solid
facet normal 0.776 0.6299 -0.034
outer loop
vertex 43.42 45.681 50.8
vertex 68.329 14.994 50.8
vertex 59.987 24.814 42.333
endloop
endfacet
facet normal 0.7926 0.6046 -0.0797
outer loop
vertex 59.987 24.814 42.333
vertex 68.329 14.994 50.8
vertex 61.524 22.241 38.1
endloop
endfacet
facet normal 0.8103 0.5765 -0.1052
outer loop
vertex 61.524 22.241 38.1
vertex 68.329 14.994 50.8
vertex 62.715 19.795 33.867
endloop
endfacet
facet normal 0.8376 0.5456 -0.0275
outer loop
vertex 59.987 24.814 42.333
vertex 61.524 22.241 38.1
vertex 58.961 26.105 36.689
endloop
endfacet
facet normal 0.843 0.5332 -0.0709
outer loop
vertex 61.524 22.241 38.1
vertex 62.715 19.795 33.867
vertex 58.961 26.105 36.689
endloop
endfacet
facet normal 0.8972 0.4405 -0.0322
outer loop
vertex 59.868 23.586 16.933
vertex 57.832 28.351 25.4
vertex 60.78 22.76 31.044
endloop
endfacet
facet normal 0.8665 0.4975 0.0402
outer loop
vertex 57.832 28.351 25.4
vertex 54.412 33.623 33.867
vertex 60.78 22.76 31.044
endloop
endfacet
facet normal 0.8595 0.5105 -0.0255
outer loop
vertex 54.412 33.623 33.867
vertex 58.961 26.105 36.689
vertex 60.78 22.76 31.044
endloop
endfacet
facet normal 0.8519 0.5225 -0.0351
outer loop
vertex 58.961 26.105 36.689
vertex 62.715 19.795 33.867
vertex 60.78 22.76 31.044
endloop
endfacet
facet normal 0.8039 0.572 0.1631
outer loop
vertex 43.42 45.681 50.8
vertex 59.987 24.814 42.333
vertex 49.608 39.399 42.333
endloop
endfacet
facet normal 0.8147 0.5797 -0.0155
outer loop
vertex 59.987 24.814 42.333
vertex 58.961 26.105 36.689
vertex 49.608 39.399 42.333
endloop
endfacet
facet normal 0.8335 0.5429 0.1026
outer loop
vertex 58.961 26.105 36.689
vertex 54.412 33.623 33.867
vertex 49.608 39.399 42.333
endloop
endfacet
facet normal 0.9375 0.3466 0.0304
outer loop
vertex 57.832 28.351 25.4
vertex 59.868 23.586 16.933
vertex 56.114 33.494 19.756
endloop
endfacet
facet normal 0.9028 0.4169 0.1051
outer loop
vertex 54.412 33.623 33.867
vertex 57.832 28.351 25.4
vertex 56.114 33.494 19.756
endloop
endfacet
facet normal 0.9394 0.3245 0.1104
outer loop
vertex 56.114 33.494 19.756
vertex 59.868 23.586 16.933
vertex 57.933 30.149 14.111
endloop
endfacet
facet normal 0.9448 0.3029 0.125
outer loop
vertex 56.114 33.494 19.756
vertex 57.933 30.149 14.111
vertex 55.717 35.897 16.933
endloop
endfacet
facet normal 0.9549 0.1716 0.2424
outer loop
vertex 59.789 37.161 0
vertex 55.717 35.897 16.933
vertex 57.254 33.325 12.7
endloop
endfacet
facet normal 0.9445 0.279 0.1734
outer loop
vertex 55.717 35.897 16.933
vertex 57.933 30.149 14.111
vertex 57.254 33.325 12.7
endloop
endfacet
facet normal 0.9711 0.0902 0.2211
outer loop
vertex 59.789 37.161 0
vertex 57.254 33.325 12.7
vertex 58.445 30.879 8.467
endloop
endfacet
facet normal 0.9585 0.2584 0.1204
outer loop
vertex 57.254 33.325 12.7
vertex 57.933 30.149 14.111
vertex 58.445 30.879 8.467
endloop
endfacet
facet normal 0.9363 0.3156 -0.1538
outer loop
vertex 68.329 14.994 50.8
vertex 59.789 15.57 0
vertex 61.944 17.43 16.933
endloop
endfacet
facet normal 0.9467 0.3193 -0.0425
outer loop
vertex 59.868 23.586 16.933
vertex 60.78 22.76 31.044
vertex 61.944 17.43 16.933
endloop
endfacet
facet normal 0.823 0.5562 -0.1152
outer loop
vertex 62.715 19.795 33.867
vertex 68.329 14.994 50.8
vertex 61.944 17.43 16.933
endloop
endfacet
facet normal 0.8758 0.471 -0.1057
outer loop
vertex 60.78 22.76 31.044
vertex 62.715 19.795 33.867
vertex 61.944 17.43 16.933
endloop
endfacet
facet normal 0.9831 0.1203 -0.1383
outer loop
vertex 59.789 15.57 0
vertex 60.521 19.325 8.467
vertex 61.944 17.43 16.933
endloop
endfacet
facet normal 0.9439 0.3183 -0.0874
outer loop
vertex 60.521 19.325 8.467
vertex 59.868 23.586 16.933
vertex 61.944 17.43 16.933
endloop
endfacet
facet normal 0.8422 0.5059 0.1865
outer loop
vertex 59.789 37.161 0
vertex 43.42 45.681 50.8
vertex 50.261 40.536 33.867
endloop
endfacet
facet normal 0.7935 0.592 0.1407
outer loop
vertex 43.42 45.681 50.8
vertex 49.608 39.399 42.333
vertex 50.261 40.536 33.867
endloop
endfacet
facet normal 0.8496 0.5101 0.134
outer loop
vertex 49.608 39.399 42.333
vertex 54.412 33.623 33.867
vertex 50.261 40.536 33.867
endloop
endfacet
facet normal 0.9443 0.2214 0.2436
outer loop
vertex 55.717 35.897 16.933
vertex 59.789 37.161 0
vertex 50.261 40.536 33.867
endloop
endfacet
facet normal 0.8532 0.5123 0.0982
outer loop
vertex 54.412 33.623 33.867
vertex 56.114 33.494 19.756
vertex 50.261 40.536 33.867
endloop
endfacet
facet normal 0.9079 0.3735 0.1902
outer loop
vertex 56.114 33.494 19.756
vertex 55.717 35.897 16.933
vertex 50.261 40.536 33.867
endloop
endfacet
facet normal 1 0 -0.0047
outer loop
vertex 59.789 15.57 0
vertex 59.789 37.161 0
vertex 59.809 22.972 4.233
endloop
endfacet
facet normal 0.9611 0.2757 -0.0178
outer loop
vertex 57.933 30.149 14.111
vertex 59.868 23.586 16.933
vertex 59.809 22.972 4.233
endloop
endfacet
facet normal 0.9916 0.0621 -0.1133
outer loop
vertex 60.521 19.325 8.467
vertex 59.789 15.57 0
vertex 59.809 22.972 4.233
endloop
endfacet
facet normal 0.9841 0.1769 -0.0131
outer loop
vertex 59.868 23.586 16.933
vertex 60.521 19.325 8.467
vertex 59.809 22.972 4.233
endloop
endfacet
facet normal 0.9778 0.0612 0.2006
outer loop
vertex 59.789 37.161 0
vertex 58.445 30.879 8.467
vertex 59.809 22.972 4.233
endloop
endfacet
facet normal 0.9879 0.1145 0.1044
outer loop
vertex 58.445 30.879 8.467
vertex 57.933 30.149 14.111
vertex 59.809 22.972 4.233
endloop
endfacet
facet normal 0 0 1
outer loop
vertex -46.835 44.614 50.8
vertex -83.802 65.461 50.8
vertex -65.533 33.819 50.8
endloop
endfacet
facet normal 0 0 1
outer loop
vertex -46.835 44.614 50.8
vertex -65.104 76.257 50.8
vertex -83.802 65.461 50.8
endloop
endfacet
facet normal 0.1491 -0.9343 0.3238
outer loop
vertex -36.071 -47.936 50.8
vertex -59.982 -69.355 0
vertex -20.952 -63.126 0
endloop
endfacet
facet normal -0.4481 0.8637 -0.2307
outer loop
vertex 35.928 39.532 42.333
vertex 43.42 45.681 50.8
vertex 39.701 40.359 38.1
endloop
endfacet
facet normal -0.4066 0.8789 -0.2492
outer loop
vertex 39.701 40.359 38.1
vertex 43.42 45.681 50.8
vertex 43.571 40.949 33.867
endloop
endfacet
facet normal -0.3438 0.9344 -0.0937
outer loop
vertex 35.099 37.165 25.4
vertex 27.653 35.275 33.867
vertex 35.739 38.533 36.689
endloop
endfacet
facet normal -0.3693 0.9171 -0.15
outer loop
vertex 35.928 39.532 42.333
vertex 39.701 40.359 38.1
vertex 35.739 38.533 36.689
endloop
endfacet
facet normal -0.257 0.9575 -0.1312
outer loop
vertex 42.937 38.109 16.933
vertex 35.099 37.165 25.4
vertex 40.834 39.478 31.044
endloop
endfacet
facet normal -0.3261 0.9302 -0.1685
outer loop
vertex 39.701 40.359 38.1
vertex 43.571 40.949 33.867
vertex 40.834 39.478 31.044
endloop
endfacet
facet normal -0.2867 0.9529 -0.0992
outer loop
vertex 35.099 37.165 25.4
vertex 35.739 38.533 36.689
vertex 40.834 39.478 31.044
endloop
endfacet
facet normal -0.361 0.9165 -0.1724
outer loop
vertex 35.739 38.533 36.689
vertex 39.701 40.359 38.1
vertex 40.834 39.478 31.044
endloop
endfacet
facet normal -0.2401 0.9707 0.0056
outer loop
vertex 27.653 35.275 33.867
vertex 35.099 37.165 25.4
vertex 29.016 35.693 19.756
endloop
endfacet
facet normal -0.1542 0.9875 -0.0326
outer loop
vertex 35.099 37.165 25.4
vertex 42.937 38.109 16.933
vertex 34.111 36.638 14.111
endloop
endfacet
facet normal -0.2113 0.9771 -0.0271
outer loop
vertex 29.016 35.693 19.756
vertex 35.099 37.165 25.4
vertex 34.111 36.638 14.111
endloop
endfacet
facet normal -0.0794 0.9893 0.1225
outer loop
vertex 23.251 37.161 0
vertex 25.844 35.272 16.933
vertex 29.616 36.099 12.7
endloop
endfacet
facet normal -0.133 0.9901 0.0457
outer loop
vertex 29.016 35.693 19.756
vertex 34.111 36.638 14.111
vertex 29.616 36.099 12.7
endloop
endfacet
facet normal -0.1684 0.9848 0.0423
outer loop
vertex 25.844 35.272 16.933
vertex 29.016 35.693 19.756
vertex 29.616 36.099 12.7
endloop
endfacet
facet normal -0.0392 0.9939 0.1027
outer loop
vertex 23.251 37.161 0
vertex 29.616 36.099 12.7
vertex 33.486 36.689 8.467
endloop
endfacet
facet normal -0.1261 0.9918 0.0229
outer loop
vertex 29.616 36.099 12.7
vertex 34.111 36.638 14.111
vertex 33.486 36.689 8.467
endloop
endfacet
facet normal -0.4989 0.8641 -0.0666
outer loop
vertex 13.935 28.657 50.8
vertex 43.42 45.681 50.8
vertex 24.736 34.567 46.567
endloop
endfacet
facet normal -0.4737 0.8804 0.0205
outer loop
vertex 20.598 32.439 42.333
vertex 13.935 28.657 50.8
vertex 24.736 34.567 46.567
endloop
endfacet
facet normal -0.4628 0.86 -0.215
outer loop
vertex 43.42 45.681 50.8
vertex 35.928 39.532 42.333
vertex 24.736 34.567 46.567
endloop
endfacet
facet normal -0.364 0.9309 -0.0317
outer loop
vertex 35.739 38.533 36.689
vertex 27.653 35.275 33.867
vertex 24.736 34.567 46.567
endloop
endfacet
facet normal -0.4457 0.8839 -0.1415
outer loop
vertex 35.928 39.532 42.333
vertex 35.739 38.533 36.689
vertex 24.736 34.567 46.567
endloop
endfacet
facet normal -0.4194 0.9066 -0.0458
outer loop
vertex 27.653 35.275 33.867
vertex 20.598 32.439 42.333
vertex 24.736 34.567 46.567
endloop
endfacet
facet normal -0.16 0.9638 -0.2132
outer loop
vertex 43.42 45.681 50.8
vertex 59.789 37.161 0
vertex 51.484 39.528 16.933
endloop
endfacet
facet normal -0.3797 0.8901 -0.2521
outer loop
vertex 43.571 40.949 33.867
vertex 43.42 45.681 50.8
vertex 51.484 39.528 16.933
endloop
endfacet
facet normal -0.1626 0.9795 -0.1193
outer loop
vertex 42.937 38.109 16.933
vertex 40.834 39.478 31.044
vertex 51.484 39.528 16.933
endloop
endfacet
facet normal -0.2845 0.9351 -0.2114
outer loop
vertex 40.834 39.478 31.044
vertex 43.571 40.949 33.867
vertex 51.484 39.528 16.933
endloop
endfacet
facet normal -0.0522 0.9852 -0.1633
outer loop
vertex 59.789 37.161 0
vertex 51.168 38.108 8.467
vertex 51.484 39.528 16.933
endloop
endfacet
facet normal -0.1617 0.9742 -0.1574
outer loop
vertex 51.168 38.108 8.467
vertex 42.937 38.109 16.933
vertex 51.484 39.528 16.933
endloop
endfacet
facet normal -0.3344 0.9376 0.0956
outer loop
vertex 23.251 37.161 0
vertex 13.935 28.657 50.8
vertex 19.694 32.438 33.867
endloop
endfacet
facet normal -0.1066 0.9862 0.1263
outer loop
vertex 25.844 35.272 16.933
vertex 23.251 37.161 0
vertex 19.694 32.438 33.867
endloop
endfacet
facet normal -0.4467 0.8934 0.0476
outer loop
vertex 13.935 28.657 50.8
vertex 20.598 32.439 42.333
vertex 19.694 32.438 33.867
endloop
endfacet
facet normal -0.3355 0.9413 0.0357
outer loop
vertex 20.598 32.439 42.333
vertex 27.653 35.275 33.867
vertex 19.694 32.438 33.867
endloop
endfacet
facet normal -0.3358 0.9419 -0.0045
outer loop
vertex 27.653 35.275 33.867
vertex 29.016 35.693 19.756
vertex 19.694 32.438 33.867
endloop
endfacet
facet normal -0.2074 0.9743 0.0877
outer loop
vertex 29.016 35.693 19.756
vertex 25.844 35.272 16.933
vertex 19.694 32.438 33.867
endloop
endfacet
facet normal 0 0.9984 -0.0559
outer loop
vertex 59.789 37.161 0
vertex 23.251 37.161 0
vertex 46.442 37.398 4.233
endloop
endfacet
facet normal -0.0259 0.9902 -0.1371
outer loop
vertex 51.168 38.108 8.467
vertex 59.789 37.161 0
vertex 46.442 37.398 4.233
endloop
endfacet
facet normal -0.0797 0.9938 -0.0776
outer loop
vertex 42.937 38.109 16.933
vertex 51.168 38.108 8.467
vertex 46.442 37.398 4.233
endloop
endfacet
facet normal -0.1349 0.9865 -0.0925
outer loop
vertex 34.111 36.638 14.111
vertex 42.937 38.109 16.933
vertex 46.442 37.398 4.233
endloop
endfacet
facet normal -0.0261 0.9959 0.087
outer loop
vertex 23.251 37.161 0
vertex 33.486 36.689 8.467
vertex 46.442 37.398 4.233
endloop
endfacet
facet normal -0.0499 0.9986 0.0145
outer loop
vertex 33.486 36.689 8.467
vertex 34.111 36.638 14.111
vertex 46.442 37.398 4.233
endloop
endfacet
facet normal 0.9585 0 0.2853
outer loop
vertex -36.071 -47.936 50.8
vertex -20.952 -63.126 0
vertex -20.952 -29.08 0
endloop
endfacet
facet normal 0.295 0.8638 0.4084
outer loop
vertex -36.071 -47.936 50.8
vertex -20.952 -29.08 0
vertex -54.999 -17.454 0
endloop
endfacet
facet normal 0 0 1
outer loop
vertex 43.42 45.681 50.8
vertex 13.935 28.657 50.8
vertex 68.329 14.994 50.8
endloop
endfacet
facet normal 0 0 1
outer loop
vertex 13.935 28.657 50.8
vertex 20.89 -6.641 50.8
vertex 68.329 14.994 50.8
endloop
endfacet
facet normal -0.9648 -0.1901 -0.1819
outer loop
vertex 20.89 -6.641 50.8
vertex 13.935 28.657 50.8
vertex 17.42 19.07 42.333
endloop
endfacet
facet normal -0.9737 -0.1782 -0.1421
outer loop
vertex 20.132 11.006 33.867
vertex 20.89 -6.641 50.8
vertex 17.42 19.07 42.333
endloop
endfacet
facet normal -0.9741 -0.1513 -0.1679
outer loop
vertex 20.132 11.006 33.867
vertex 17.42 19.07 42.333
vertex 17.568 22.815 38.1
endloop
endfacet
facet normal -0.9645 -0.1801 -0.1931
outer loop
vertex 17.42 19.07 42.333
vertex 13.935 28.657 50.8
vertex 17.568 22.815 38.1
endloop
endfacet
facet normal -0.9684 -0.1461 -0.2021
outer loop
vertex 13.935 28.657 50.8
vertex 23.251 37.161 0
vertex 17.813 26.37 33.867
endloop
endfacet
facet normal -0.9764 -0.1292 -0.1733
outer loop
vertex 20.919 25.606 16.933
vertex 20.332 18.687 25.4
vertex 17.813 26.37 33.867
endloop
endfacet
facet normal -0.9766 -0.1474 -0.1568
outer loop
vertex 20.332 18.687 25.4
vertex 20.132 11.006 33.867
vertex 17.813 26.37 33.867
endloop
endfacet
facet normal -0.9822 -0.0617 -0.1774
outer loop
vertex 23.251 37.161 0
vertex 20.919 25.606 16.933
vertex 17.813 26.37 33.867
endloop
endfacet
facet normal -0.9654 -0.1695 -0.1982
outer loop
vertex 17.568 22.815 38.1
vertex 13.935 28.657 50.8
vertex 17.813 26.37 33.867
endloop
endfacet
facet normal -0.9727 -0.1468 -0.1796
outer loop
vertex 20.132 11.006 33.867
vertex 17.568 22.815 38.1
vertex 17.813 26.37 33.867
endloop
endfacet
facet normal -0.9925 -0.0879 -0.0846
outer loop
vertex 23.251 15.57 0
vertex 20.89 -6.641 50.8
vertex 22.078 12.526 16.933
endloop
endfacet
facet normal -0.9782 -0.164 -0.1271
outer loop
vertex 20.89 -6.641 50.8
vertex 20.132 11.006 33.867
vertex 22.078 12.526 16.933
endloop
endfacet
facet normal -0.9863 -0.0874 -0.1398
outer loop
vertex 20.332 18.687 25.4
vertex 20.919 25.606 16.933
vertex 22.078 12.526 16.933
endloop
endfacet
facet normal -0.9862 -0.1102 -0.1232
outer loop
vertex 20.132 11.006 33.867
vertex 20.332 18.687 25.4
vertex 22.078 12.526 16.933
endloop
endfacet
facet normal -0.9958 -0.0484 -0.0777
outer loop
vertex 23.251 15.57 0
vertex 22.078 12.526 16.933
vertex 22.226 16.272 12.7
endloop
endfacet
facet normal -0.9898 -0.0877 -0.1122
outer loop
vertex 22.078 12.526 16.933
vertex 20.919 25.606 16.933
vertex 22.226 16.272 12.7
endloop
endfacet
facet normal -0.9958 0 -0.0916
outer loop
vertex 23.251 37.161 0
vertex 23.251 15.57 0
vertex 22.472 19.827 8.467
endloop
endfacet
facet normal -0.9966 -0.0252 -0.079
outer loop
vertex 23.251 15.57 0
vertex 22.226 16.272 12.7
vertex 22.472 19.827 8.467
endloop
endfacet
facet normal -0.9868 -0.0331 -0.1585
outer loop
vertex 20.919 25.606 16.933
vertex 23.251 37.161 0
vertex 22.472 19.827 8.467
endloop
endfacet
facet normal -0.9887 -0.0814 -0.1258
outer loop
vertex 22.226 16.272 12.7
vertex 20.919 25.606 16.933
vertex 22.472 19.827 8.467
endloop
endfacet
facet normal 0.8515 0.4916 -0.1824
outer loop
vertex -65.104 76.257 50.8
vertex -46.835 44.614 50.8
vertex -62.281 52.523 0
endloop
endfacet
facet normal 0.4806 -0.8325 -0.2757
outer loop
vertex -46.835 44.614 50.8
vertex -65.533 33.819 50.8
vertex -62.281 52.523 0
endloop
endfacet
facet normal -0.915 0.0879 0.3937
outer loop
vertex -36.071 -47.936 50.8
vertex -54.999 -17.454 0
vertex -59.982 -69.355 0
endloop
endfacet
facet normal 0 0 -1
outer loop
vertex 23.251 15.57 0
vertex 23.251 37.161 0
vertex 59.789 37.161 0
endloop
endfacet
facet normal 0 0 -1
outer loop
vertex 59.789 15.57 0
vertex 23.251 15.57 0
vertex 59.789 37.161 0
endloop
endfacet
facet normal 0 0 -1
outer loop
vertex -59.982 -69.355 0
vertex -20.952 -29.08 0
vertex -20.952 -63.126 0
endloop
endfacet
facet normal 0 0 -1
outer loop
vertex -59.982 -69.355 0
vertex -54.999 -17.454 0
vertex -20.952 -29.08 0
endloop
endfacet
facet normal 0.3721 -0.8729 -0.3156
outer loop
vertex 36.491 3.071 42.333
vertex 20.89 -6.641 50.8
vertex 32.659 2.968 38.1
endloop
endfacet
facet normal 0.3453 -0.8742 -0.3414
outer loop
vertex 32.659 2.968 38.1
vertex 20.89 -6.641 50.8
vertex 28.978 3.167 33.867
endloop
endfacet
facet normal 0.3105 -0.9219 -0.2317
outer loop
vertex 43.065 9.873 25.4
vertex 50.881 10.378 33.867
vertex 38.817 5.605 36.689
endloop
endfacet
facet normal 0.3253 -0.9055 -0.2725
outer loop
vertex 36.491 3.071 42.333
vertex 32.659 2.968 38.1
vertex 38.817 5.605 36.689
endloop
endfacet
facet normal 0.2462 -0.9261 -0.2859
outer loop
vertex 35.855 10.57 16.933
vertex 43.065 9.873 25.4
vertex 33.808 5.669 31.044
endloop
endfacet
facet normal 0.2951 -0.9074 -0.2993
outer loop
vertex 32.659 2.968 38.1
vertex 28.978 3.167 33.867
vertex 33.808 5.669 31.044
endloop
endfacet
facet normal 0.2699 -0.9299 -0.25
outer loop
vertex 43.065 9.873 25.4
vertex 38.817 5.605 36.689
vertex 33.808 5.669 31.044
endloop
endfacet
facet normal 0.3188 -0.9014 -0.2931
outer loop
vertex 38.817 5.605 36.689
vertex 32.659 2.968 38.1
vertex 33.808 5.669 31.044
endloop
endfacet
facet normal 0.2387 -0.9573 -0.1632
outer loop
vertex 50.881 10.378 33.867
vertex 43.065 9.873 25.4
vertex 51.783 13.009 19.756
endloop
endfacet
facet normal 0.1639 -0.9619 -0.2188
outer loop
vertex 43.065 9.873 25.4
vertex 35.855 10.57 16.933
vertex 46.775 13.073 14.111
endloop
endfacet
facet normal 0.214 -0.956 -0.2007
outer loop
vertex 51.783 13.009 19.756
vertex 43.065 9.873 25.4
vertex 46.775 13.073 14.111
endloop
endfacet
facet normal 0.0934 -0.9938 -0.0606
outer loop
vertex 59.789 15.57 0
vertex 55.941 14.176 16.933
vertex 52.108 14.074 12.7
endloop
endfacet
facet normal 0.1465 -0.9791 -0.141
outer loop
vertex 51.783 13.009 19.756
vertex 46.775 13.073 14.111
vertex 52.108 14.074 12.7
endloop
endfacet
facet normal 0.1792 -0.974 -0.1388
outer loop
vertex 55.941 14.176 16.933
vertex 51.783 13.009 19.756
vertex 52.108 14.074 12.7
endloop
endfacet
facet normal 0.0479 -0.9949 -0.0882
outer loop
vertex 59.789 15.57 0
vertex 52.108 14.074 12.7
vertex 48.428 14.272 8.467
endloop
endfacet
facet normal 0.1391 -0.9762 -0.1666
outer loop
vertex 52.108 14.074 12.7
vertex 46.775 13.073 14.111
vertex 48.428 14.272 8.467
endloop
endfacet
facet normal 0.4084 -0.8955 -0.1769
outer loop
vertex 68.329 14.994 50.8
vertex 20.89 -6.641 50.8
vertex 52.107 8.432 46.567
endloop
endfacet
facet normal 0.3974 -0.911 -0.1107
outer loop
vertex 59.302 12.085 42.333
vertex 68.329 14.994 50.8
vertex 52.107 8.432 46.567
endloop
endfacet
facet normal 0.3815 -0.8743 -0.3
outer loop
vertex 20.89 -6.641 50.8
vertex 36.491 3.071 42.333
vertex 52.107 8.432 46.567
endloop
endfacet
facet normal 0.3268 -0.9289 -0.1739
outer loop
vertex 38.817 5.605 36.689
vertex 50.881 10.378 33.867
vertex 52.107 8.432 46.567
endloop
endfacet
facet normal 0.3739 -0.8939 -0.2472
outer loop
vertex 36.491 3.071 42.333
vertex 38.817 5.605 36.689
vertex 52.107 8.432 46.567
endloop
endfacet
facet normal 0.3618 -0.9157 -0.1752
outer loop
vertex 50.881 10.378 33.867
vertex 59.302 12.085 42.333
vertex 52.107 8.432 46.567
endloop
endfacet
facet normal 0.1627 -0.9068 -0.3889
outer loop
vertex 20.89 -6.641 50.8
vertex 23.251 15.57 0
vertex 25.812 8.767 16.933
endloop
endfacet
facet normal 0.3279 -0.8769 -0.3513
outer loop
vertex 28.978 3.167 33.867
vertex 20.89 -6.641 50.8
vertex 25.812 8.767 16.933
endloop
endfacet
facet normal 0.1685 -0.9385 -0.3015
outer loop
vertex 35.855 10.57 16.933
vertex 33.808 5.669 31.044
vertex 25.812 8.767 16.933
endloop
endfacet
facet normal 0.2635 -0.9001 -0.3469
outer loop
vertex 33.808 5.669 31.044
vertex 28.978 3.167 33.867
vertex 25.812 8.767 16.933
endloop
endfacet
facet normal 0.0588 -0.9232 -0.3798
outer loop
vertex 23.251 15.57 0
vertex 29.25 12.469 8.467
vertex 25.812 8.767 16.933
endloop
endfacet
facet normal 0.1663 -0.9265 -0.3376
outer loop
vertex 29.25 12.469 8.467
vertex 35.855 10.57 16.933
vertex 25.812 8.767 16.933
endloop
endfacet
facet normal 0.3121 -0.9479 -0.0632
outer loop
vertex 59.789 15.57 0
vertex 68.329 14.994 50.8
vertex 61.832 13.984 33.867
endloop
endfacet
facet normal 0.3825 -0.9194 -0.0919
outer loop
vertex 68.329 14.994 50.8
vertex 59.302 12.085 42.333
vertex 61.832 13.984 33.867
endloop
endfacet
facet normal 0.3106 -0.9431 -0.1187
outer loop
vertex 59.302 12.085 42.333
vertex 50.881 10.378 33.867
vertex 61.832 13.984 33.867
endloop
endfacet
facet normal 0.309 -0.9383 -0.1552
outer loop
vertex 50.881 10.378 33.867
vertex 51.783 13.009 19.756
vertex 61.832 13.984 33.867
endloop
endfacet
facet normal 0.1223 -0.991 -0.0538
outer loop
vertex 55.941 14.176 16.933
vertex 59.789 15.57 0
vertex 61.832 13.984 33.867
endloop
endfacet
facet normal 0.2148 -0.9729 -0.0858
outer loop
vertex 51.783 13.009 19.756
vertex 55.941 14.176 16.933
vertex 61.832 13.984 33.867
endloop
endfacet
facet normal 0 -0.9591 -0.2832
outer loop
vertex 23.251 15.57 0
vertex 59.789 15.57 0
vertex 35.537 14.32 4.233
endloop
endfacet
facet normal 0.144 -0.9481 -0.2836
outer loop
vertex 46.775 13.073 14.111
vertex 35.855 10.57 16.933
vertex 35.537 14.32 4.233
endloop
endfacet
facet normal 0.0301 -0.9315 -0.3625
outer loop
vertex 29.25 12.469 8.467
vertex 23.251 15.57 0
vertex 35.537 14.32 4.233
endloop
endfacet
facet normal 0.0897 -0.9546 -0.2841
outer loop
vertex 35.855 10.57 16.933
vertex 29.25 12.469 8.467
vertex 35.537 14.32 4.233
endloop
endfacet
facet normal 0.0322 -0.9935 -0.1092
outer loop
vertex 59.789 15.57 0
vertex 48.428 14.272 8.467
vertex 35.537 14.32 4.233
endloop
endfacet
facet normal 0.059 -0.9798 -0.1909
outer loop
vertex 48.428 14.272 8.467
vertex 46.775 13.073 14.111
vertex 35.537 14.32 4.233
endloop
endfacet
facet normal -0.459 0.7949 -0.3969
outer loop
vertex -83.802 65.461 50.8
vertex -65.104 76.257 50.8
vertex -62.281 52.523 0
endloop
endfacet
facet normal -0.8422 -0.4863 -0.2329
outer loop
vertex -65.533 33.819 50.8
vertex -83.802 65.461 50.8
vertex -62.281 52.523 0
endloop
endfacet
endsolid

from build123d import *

# Parameters (mm, degrees)
F0_W = 36.537992
F0_H = 21.590633


with BuildPart() as f3:
    # F2 (on offset) → F3 section 0
    with BuildSketch(Plane.XY.offset(50.8)):
        Polygon((13.935128, 28.657244), (20.890336, -6.640986), (68.328768, 14.994361), (43.420492, 45.680626), align=None)
    # F0 (on Top) → F3 section 1
    with BuildSketch(Plane.XY):
        with Locations((41.520446, 26.365479)):
            Rectangle(F0_W, F0_H)
    loft()


with BuildPart() as f4:
    # F0 (on Top) → F4 section 0
    with BuildSketch(Plane.XY, mode=Mode.PRIVATE) as f4_s0:
        Polygon((-20.952431, -29.079724), (-54.999199, -17.453996), (-59.981655, -69.354557), (-20.952431, -63.12649), align=None)
    loft([f4_s0.sketch, Vertex(-36.071093, -47.935609, 50.8)])


with BuildPart() as f5:
    # F2 (on offset) → F5 section 0
    with BuildSketch(Plane.XY.offset(50.8), mode=Mode.PRIVATE) as f5_s0:
        Polygon((-83.801781, 65.461497), (-65.532785, 33.818668), (-46.834748, 44.613985), (-65.103744, 76.256814), align=None)
    loft([f5_s0.sketch, Vertex(-62.280677, 52.52336, 0)])


solid = Compound([f3.part, f4.part, f5.part])
